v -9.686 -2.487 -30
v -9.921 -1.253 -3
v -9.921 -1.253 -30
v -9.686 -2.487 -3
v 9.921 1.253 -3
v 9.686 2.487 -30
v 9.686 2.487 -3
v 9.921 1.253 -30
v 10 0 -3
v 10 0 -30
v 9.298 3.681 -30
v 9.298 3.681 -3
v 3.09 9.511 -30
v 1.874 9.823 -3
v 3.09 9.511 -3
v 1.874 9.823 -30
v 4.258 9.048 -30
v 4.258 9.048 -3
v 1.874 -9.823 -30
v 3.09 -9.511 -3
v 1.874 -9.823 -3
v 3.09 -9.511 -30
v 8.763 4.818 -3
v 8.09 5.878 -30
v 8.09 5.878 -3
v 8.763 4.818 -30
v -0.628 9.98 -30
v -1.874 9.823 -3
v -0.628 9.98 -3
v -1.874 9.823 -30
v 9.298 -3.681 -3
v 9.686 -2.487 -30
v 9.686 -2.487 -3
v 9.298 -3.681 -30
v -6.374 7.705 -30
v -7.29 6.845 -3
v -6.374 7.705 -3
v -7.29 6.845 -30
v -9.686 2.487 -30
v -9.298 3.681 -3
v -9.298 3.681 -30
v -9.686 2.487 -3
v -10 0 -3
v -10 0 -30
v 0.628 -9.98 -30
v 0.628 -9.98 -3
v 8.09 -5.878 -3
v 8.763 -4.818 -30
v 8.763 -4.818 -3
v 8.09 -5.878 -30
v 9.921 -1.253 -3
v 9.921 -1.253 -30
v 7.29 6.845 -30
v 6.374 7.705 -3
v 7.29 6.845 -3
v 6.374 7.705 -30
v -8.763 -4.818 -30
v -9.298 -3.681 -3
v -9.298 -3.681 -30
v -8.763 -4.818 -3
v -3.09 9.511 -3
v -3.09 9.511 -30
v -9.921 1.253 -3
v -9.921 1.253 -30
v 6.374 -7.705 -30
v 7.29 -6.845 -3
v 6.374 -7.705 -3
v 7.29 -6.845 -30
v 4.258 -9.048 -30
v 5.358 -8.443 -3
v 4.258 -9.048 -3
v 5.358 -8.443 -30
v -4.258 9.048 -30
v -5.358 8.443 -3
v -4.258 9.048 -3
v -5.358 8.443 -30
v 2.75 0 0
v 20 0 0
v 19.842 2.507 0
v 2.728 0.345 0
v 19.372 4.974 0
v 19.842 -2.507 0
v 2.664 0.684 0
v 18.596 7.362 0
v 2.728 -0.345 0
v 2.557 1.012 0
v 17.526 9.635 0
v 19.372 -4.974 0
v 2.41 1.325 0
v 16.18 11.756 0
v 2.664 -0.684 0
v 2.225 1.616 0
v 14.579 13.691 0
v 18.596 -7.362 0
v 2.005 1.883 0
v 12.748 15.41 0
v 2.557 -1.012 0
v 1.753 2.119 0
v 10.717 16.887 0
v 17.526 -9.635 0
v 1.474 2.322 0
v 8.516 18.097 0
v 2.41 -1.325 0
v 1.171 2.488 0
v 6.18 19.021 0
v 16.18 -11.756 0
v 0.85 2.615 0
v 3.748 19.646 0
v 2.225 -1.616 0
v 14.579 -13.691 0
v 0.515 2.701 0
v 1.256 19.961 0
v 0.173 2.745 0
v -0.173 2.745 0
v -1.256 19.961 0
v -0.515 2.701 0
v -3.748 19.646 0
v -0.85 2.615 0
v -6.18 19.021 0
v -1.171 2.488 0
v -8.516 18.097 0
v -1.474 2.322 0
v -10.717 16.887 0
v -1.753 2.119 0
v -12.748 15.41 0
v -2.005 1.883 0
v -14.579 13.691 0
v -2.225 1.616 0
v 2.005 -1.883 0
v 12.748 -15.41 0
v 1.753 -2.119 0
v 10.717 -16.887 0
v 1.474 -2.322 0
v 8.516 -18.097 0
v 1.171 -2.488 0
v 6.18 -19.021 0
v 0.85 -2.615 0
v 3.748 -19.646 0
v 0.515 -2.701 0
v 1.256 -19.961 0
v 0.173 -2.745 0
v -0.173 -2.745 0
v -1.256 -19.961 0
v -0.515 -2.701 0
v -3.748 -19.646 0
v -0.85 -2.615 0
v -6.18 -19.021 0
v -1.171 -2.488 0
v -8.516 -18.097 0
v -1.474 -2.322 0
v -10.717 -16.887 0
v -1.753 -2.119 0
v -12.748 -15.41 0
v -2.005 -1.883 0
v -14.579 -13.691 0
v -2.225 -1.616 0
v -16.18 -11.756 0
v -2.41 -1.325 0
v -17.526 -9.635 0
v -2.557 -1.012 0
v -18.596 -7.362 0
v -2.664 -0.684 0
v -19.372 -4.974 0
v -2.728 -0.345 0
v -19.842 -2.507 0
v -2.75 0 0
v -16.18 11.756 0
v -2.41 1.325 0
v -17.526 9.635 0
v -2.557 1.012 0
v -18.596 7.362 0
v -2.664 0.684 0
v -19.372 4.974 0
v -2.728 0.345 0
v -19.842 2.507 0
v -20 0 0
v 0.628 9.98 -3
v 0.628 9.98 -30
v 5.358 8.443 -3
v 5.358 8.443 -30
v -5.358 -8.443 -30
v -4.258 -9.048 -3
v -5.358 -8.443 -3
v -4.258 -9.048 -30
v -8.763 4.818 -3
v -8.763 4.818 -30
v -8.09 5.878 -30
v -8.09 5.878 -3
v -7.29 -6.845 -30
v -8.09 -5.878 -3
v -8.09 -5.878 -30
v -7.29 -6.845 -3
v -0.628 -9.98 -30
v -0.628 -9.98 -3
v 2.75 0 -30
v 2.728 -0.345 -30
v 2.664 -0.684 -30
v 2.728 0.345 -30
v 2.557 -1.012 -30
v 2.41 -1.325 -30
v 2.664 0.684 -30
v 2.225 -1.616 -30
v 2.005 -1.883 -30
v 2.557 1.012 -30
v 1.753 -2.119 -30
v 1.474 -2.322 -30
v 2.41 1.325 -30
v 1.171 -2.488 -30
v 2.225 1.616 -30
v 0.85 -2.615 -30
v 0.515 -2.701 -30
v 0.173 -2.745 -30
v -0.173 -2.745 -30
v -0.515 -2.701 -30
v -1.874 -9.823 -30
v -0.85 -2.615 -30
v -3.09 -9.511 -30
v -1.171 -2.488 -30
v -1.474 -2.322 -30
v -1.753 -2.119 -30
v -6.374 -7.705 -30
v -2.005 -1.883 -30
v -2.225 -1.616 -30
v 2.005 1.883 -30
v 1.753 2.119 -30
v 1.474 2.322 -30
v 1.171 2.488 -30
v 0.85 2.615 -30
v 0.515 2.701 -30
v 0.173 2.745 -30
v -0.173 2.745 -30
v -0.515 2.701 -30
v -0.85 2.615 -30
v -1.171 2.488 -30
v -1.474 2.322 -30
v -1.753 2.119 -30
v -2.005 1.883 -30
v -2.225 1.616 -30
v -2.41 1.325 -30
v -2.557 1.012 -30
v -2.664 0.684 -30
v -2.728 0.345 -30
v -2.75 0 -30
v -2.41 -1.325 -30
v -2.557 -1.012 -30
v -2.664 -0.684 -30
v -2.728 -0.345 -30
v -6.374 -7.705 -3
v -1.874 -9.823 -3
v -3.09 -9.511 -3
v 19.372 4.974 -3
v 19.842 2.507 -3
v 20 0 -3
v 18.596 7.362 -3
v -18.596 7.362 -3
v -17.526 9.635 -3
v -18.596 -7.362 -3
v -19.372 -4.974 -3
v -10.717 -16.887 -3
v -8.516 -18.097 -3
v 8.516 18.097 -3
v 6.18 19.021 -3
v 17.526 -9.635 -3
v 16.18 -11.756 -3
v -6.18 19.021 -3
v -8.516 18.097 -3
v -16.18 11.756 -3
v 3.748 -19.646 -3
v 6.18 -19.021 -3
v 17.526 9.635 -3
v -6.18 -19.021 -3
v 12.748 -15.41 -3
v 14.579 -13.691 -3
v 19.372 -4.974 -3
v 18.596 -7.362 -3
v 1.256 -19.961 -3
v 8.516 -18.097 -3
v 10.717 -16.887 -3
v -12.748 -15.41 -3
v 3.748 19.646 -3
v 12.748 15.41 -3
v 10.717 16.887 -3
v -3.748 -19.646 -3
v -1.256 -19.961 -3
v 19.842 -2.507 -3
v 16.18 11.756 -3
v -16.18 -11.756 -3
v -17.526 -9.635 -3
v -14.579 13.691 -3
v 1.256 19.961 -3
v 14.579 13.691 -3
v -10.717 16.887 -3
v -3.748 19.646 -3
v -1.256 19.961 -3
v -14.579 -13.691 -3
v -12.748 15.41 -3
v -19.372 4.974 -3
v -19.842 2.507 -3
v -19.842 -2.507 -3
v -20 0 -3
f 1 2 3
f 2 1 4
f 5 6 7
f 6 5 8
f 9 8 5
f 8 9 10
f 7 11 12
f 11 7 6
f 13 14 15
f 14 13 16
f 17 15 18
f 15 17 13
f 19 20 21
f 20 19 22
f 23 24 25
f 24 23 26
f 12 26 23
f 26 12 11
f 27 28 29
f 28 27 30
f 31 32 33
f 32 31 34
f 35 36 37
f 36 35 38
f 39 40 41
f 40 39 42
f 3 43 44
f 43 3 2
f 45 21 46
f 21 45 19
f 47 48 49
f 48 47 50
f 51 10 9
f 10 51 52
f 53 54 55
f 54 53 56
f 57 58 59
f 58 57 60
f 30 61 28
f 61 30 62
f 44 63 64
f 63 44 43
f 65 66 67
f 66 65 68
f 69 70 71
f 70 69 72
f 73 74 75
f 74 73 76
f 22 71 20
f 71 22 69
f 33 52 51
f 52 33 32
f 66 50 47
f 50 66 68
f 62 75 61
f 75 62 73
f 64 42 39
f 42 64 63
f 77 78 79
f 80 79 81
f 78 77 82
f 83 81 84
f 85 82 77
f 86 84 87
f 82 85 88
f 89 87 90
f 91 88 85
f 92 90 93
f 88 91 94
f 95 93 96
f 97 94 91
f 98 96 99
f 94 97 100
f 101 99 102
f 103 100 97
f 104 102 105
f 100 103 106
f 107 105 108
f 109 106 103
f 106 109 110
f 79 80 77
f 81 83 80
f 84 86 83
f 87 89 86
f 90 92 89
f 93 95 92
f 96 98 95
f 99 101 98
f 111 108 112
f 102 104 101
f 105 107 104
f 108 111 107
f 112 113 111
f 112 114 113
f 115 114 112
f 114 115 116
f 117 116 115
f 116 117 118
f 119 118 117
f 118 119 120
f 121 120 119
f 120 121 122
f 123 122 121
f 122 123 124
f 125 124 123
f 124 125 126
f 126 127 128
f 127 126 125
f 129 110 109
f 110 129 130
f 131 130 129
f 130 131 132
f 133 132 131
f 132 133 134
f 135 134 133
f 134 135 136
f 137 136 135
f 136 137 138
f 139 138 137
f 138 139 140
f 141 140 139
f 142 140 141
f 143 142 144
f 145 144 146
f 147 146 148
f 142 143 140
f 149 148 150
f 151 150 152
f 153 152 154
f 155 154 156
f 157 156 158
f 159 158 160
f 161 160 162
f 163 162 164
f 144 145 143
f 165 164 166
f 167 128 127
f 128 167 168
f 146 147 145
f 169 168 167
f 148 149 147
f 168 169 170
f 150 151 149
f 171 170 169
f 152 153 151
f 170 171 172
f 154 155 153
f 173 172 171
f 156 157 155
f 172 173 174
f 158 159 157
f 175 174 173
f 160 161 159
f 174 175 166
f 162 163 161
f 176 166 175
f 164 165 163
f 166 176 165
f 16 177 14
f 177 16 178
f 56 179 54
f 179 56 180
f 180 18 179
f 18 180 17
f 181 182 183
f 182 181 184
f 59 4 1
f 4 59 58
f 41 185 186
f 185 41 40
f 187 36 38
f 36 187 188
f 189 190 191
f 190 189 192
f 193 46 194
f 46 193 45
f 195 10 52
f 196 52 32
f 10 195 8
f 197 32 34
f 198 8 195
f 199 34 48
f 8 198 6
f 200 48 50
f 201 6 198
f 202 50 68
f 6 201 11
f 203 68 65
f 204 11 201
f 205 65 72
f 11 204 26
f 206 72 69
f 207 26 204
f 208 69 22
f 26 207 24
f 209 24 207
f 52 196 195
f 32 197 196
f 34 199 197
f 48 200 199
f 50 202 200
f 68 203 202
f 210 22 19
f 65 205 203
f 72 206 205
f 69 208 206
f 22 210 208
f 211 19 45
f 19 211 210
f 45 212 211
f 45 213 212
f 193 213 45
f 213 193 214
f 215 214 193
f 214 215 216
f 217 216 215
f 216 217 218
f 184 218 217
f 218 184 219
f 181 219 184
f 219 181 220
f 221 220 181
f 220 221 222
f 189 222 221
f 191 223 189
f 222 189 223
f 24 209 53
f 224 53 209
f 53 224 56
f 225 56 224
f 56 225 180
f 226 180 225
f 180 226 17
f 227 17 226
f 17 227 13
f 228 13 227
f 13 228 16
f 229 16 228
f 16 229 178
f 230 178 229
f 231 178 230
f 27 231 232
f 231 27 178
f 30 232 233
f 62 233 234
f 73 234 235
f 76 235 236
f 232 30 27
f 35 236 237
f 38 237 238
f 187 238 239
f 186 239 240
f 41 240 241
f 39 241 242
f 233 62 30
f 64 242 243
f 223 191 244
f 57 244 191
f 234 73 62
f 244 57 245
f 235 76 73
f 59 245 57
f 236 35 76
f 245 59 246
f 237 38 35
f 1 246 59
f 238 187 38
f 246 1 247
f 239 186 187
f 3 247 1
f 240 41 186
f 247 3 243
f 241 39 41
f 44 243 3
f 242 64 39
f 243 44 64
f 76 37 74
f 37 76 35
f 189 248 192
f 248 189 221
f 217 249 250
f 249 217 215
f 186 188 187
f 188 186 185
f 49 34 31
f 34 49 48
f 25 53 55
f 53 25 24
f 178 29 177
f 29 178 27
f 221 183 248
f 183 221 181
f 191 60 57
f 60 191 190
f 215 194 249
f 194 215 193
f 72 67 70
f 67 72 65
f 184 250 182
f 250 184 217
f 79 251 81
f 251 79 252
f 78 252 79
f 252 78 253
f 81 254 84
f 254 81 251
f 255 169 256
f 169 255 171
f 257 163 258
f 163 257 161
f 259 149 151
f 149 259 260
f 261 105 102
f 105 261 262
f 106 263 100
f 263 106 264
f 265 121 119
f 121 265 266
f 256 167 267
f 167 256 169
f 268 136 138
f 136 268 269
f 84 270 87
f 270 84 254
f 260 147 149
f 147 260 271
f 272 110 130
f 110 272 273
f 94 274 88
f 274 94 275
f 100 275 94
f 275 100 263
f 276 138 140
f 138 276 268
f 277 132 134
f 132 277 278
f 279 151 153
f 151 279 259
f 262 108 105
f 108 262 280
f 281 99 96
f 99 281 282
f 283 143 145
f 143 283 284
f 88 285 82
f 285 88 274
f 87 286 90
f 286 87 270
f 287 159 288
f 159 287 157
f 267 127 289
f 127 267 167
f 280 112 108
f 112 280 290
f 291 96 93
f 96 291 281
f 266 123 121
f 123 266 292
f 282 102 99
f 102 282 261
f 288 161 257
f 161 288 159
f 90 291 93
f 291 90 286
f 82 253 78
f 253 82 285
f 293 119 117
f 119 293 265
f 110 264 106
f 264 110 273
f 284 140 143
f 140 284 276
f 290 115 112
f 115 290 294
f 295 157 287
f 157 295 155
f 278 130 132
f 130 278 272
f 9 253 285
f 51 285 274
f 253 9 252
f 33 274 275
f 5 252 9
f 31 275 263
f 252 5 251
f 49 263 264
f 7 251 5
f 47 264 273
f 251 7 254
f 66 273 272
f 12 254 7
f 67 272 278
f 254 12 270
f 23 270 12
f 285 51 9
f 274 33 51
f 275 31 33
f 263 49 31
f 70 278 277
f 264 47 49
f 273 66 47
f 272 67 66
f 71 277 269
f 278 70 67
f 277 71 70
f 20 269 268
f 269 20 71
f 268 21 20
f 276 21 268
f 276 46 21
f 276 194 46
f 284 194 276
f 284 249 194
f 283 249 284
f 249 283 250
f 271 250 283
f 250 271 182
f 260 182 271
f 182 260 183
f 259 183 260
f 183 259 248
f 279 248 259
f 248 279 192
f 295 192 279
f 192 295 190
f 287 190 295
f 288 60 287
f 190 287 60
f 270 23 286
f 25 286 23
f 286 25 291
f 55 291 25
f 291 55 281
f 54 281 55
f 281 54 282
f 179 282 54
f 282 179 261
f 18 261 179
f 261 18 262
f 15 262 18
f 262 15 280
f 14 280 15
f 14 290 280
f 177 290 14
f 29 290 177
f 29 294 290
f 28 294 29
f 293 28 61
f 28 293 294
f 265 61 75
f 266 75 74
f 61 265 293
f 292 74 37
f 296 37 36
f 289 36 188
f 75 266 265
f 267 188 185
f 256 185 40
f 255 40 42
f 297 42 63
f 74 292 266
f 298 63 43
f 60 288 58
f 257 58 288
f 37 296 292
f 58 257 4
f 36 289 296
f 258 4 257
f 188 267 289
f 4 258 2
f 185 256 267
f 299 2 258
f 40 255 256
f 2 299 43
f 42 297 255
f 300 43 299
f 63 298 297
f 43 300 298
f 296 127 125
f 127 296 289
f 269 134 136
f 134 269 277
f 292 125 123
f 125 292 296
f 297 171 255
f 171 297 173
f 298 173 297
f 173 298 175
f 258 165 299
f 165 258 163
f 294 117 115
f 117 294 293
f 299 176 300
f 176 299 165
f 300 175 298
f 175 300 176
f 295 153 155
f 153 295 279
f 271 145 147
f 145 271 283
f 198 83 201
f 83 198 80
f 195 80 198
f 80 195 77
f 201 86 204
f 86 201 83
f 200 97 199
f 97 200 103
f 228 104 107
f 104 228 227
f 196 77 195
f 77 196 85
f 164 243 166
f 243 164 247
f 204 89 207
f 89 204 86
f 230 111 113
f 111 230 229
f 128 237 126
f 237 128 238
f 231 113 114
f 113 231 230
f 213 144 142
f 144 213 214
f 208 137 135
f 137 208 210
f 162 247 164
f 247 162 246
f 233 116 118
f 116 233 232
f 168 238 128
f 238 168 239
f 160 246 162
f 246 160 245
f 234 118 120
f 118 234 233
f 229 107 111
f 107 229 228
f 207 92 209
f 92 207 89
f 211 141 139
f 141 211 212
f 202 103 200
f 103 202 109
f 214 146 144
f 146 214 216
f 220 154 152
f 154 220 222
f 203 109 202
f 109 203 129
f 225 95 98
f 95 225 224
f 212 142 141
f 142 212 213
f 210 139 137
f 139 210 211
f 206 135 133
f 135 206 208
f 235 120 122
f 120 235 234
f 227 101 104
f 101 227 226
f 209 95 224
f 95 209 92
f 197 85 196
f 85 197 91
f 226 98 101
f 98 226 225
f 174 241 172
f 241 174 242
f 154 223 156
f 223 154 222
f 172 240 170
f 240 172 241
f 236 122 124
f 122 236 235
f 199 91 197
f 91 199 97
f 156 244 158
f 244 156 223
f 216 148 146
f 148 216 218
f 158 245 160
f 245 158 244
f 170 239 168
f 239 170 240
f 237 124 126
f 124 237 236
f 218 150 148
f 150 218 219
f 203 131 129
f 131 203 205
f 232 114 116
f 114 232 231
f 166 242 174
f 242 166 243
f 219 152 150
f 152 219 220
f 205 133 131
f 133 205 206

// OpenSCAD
$fn = 50;


difference() {
	union() {
		translate(v = [0, 0, -30.0000000000]) {
			cylinder(h = 30, r = 10.0000000000);
		}
		translate(v = [0, 0, -3.0000000000]) {
			cylinder(h = 3, r = 20.0000000000);
		}
	}
	union() {
		#translate(v = [0, 0, -30]) {
			cylinder(h = 30, r = 2.7500000000);
		}
	}
}
